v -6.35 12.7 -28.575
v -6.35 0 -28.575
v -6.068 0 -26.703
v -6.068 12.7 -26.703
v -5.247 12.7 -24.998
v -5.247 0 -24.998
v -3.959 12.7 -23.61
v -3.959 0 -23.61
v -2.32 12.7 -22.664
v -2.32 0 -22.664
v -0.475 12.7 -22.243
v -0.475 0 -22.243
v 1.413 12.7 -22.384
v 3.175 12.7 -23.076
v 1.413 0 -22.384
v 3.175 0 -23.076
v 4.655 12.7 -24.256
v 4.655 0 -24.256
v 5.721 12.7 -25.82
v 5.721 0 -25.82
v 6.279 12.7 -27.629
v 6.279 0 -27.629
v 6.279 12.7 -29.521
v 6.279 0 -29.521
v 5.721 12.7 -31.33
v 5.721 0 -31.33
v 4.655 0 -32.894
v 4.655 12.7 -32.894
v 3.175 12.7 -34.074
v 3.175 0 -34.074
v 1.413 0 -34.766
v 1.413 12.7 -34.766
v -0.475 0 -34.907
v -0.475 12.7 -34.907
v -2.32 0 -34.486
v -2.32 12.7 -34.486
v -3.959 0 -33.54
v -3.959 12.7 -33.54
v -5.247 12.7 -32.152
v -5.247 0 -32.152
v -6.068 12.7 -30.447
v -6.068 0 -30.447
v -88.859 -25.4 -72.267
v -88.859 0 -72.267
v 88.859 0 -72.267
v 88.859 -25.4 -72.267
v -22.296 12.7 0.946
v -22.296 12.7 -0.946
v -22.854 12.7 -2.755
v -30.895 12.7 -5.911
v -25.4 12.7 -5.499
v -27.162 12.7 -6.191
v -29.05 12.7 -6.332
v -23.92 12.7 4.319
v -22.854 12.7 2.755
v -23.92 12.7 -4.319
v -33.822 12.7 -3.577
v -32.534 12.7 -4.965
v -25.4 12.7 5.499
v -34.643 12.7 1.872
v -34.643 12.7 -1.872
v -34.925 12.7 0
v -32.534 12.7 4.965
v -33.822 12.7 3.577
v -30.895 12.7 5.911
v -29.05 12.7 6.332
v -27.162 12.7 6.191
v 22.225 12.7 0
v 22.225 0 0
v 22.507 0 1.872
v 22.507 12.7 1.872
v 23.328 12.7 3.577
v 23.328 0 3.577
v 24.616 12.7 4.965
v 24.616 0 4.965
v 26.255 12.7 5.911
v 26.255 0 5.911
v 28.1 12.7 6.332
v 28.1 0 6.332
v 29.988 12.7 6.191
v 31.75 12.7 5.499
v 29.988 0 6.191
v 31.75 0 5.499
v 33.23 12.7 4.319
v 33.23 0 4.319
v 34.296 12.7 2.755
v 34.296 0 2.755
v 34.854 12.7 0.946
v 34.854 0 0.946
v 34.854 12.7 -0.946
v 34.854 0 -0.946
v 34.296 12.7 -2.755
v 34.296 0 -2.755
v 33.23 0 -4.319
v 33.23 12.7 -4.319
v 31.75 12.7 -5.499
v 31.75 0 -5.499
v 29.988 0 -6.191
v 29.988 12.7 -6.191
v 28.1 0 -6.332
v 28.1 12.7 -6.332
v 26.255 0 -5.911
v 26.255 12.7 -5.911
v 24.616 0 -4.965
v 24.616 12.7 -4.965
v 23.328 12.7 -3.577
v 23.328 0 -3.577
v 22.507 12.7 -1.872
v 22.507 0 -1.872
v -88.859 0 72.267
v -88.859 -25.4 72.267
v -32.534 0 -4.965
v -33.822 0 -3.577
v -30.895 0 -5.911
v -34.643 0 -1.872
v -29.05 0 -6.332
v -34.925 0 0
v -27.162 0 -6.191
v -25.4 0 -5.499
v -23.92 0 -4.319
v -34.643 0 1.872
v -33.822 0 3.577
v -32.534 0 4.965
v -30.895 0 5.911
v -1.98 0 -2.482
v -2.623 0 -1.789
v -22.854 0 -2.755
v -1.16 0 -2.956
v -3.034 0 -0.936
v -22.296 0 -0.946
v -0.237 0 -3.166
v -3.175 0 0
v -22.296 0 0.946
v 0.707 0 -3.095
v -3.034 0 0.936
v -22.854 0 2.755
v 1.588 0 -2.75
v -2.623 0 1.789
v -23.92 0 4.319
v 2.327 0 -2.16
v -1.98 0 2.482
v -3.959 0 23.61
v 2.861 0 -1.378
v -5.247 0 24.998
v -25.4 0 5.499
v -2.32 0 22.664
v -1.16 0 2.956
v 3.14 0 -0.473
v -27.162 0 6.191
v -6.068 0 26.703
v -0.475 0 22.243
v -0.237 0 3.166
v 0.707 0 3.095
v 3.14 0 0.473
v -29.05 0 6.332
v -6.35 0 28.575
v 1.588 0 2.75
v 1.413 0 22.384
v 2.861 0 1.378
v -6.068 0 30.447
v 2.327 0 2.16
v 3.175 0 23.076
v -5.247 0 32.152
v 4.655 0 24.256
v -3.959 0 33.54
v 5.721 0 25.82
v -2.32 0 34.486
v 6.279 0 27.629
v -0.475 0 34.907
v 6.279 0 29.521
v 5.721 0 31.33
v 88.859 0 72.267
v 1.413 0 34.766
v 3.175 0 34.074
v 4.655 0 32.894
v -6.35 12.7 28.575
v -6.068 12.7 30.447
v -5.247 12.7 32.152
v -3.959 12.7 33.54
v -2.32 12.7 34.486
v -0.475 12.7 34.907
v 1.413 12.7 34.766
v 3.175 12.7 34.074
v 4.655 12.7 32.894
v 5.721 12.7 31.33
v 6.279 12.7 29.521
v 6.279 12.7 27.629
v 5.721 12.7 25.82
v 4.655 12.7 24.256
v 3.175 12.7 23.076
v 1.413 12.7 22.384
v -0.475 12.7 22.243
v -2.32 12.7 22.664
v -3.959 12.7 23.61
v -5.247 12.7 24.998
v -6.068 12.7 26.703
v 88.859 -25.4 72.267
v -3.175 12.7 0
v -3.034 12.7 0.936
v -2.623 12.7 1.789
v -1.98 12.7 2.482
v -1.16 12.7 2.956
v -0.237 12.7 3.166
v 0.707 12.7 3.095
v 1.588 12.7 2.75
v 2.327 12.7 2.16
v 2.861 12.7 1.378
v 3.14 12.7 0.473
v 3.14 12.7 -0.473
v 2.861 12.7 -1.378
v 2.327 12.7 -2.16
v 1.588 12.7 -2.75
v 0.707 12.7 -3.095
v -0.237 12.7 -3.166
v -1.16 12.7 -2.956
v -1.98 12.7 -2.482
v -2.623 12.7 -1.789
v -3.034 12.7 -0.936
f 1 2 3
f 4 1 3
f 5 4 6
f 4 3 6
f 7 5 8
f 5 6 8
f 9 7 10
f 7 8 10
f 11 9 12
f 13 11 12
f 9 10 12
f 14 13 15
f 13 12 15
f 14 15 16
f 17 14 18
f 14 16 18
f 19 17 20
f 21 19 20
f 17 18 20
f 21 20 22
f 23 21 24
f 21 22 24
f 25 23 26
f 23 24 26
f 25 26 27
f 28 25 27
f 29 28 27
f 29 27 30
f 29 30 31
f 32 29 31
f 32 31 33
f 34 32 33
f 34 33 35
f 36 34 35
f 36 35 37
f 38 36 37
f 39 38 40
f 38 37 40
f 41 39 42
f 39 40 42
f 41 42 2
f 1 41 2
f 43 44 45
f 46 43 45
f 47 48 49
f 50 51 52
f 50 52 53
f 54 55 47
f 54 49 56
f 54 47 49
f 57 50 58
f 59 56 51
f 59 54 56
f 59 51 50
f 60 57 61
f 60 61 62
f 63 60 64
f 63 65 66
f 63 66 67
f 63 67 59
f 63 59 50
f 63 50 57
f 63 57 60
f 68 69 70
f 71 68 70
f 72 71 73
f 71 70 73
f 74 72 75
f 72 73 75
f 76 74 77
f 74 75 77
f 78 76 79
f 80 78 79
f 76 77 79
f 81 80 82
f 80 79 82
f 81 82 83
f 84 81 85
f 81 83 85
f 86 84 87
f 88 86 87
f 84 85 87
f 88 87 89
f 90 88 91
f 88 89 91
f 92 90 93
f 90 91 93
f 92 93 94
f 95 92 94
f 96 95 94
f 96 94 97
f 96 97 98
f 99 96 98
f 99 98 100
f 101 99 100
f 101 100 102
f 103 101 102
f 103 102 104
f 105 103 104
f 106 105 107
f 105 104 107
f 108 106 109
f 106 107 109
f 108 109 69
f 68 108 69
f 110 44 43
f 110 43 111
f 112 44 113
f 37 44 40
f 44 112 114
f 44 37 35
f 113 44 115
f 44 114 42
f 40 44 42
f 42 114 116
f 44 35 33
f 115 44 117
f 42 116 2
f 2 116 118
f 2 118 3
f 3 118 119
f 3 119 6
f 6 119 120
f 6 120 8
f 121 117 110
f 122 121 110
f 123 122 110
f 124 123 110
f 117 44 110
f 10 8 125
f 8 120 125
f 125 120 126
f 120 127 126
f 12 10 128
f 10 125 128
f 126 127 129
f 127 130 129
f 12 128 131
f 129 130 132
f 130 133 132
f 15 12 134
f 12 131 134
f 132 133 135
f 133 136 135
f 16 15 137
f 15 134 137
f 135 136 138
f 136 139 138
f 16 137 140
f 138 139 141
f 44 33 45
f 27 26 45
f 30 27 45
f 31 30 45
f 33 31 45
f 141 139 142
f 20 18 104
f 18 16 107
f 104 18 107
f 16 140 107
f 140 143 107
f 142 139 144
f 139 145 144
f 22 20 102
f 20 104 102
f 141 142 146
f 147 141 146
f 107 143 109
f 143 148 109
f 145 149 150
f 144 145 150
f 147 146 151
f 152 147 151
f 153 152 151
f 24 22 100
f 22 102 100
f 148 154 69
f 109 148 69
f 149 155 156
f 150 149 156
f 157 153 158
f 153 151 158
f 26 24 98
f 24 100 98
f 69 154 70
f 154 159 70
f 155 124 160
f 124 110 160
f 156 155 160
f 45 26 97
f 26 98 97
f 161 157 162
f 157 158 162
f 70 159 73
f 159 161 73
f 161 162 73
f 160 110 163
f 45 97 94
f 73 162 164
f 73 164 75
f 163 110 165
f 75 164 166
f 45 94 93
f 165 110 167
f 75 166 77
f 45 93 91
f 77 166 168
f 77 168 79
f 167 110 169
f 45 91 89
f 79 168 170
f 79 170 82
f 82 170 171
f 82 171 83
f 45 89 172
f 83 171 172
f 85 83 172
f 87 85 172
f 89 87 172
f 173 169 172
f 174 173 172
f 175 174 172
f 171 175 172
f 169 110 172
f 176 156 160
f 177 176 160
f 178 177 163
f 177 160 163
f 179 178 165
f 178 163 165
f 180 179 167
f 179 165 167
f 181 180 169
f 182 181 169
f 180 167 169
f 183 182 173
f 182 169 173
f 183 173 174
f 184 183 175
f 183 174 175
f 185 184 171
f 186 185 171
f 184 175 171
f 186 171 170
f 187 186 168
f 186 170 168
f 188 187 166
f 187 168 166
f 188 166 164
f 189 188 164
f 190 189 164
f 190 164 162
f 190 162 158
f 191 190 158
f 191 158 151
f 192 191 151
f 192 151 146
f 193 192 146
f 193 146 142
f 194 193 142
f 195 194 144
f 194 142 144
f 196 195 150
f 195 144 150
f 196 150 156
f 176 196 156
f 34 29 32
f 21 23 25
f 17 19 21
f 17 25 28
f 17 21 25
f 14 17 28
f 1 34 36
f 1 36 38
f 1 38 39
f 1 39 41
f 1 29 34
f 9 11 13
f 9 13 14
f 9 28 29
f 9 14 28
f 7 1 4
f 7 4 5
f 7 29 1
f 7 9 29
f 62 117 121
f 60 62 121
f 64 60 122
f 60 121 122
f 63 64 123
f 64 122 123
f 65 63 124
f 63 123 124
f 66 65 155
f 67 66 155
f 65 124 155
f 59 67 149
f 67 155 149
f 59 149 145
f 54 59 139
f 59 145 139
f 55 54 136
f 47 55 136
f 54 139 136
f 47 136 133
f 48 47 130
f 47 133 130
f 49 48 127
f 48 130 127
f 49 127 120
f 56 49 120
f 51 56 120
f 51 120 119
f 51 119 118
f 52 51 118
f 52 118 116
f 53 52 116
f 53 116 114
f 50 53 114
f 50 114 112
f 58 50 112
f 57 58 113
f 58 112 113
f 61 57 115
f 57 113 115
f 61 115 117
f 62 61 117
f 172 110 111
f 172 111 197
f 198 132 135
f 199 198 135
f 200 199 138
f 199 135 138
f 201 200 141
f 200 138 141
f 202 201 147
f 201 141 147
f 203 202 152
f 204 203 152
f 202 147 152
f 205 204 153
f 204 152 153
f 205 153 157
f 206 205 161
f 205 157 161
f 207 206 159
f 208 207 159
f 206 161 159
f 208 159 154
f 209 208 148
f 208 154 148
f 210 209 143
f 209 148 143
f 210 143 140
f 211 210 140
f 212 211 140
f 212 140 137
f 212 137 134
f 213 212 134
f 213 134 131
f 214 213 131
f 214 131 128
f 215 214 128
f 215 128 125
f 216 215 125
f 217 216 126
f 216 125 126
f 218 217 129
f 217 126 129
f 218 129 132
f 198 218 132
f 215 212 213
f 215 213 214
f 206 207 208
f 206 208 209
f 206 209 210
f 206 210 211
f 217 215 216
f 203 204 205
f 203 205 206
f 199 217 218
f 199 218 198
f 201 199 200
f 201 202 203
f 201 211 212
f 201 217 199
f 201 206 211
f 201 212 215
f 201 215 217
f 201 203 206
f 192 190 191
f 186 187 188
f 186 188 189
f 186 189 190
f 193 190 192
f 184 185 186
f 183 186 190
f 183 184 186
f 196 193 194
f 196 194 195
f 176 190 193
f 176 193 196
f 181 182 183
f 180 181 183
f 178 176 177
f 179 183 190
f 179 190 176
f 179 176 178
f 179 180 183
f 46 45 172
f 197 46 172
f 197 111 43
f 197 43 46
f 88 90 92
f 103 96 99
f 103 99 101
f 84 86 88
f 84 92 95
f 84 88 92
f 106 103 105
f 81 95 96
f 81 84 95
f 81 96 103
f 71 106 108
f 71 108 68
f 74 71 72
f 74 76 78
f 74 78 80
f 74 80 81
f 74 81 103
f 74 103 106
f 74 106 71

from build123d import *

# Parameters (mm, degrees)
F0_W     = 177.718074
F0_H     = 144.534186
F1_DEPTH = 25.4
F3_R     = 3.175
F4_DEPTH = 12.7
F5_R     = 6.35
F6_DEPTH = 12.7


with BuildPart() as f1:
    # F0 (on Front) → F1 (new body)
    with BuildSketch(Plane.XZ):
        Rectangle(F0_W, F0_H)
    extrude(amount=F1_DEPTH)

    # F3 (on face) → F4 (join)
    with BuildSketch(Plane(origin=(0, 0, 0), x_dir=(-1, 0, 0), z_dir=(0, 1, 0))):
        Circle(F3_R)
    extrude(amount=F4_DEPTH)

    # F5 (on face) → F6 (join)
    with BuildSketch(Plane(origin=(0, 0, 0), x_dir=(-1, 0, 0), z_dir=(0, 1, 0))):
        with Locations((-28.575, 0)):
            Circle(F5_R)
        with Locations((0, 28.575)):
            Circle(F5_R)
        with Locations((28.575, 0)):
            Circle(F5_R)
        with Locations((0, -28.575)):
            Circle(F5_R)
    extrude(amount=F6_DEPTH)


solid = f1.part
